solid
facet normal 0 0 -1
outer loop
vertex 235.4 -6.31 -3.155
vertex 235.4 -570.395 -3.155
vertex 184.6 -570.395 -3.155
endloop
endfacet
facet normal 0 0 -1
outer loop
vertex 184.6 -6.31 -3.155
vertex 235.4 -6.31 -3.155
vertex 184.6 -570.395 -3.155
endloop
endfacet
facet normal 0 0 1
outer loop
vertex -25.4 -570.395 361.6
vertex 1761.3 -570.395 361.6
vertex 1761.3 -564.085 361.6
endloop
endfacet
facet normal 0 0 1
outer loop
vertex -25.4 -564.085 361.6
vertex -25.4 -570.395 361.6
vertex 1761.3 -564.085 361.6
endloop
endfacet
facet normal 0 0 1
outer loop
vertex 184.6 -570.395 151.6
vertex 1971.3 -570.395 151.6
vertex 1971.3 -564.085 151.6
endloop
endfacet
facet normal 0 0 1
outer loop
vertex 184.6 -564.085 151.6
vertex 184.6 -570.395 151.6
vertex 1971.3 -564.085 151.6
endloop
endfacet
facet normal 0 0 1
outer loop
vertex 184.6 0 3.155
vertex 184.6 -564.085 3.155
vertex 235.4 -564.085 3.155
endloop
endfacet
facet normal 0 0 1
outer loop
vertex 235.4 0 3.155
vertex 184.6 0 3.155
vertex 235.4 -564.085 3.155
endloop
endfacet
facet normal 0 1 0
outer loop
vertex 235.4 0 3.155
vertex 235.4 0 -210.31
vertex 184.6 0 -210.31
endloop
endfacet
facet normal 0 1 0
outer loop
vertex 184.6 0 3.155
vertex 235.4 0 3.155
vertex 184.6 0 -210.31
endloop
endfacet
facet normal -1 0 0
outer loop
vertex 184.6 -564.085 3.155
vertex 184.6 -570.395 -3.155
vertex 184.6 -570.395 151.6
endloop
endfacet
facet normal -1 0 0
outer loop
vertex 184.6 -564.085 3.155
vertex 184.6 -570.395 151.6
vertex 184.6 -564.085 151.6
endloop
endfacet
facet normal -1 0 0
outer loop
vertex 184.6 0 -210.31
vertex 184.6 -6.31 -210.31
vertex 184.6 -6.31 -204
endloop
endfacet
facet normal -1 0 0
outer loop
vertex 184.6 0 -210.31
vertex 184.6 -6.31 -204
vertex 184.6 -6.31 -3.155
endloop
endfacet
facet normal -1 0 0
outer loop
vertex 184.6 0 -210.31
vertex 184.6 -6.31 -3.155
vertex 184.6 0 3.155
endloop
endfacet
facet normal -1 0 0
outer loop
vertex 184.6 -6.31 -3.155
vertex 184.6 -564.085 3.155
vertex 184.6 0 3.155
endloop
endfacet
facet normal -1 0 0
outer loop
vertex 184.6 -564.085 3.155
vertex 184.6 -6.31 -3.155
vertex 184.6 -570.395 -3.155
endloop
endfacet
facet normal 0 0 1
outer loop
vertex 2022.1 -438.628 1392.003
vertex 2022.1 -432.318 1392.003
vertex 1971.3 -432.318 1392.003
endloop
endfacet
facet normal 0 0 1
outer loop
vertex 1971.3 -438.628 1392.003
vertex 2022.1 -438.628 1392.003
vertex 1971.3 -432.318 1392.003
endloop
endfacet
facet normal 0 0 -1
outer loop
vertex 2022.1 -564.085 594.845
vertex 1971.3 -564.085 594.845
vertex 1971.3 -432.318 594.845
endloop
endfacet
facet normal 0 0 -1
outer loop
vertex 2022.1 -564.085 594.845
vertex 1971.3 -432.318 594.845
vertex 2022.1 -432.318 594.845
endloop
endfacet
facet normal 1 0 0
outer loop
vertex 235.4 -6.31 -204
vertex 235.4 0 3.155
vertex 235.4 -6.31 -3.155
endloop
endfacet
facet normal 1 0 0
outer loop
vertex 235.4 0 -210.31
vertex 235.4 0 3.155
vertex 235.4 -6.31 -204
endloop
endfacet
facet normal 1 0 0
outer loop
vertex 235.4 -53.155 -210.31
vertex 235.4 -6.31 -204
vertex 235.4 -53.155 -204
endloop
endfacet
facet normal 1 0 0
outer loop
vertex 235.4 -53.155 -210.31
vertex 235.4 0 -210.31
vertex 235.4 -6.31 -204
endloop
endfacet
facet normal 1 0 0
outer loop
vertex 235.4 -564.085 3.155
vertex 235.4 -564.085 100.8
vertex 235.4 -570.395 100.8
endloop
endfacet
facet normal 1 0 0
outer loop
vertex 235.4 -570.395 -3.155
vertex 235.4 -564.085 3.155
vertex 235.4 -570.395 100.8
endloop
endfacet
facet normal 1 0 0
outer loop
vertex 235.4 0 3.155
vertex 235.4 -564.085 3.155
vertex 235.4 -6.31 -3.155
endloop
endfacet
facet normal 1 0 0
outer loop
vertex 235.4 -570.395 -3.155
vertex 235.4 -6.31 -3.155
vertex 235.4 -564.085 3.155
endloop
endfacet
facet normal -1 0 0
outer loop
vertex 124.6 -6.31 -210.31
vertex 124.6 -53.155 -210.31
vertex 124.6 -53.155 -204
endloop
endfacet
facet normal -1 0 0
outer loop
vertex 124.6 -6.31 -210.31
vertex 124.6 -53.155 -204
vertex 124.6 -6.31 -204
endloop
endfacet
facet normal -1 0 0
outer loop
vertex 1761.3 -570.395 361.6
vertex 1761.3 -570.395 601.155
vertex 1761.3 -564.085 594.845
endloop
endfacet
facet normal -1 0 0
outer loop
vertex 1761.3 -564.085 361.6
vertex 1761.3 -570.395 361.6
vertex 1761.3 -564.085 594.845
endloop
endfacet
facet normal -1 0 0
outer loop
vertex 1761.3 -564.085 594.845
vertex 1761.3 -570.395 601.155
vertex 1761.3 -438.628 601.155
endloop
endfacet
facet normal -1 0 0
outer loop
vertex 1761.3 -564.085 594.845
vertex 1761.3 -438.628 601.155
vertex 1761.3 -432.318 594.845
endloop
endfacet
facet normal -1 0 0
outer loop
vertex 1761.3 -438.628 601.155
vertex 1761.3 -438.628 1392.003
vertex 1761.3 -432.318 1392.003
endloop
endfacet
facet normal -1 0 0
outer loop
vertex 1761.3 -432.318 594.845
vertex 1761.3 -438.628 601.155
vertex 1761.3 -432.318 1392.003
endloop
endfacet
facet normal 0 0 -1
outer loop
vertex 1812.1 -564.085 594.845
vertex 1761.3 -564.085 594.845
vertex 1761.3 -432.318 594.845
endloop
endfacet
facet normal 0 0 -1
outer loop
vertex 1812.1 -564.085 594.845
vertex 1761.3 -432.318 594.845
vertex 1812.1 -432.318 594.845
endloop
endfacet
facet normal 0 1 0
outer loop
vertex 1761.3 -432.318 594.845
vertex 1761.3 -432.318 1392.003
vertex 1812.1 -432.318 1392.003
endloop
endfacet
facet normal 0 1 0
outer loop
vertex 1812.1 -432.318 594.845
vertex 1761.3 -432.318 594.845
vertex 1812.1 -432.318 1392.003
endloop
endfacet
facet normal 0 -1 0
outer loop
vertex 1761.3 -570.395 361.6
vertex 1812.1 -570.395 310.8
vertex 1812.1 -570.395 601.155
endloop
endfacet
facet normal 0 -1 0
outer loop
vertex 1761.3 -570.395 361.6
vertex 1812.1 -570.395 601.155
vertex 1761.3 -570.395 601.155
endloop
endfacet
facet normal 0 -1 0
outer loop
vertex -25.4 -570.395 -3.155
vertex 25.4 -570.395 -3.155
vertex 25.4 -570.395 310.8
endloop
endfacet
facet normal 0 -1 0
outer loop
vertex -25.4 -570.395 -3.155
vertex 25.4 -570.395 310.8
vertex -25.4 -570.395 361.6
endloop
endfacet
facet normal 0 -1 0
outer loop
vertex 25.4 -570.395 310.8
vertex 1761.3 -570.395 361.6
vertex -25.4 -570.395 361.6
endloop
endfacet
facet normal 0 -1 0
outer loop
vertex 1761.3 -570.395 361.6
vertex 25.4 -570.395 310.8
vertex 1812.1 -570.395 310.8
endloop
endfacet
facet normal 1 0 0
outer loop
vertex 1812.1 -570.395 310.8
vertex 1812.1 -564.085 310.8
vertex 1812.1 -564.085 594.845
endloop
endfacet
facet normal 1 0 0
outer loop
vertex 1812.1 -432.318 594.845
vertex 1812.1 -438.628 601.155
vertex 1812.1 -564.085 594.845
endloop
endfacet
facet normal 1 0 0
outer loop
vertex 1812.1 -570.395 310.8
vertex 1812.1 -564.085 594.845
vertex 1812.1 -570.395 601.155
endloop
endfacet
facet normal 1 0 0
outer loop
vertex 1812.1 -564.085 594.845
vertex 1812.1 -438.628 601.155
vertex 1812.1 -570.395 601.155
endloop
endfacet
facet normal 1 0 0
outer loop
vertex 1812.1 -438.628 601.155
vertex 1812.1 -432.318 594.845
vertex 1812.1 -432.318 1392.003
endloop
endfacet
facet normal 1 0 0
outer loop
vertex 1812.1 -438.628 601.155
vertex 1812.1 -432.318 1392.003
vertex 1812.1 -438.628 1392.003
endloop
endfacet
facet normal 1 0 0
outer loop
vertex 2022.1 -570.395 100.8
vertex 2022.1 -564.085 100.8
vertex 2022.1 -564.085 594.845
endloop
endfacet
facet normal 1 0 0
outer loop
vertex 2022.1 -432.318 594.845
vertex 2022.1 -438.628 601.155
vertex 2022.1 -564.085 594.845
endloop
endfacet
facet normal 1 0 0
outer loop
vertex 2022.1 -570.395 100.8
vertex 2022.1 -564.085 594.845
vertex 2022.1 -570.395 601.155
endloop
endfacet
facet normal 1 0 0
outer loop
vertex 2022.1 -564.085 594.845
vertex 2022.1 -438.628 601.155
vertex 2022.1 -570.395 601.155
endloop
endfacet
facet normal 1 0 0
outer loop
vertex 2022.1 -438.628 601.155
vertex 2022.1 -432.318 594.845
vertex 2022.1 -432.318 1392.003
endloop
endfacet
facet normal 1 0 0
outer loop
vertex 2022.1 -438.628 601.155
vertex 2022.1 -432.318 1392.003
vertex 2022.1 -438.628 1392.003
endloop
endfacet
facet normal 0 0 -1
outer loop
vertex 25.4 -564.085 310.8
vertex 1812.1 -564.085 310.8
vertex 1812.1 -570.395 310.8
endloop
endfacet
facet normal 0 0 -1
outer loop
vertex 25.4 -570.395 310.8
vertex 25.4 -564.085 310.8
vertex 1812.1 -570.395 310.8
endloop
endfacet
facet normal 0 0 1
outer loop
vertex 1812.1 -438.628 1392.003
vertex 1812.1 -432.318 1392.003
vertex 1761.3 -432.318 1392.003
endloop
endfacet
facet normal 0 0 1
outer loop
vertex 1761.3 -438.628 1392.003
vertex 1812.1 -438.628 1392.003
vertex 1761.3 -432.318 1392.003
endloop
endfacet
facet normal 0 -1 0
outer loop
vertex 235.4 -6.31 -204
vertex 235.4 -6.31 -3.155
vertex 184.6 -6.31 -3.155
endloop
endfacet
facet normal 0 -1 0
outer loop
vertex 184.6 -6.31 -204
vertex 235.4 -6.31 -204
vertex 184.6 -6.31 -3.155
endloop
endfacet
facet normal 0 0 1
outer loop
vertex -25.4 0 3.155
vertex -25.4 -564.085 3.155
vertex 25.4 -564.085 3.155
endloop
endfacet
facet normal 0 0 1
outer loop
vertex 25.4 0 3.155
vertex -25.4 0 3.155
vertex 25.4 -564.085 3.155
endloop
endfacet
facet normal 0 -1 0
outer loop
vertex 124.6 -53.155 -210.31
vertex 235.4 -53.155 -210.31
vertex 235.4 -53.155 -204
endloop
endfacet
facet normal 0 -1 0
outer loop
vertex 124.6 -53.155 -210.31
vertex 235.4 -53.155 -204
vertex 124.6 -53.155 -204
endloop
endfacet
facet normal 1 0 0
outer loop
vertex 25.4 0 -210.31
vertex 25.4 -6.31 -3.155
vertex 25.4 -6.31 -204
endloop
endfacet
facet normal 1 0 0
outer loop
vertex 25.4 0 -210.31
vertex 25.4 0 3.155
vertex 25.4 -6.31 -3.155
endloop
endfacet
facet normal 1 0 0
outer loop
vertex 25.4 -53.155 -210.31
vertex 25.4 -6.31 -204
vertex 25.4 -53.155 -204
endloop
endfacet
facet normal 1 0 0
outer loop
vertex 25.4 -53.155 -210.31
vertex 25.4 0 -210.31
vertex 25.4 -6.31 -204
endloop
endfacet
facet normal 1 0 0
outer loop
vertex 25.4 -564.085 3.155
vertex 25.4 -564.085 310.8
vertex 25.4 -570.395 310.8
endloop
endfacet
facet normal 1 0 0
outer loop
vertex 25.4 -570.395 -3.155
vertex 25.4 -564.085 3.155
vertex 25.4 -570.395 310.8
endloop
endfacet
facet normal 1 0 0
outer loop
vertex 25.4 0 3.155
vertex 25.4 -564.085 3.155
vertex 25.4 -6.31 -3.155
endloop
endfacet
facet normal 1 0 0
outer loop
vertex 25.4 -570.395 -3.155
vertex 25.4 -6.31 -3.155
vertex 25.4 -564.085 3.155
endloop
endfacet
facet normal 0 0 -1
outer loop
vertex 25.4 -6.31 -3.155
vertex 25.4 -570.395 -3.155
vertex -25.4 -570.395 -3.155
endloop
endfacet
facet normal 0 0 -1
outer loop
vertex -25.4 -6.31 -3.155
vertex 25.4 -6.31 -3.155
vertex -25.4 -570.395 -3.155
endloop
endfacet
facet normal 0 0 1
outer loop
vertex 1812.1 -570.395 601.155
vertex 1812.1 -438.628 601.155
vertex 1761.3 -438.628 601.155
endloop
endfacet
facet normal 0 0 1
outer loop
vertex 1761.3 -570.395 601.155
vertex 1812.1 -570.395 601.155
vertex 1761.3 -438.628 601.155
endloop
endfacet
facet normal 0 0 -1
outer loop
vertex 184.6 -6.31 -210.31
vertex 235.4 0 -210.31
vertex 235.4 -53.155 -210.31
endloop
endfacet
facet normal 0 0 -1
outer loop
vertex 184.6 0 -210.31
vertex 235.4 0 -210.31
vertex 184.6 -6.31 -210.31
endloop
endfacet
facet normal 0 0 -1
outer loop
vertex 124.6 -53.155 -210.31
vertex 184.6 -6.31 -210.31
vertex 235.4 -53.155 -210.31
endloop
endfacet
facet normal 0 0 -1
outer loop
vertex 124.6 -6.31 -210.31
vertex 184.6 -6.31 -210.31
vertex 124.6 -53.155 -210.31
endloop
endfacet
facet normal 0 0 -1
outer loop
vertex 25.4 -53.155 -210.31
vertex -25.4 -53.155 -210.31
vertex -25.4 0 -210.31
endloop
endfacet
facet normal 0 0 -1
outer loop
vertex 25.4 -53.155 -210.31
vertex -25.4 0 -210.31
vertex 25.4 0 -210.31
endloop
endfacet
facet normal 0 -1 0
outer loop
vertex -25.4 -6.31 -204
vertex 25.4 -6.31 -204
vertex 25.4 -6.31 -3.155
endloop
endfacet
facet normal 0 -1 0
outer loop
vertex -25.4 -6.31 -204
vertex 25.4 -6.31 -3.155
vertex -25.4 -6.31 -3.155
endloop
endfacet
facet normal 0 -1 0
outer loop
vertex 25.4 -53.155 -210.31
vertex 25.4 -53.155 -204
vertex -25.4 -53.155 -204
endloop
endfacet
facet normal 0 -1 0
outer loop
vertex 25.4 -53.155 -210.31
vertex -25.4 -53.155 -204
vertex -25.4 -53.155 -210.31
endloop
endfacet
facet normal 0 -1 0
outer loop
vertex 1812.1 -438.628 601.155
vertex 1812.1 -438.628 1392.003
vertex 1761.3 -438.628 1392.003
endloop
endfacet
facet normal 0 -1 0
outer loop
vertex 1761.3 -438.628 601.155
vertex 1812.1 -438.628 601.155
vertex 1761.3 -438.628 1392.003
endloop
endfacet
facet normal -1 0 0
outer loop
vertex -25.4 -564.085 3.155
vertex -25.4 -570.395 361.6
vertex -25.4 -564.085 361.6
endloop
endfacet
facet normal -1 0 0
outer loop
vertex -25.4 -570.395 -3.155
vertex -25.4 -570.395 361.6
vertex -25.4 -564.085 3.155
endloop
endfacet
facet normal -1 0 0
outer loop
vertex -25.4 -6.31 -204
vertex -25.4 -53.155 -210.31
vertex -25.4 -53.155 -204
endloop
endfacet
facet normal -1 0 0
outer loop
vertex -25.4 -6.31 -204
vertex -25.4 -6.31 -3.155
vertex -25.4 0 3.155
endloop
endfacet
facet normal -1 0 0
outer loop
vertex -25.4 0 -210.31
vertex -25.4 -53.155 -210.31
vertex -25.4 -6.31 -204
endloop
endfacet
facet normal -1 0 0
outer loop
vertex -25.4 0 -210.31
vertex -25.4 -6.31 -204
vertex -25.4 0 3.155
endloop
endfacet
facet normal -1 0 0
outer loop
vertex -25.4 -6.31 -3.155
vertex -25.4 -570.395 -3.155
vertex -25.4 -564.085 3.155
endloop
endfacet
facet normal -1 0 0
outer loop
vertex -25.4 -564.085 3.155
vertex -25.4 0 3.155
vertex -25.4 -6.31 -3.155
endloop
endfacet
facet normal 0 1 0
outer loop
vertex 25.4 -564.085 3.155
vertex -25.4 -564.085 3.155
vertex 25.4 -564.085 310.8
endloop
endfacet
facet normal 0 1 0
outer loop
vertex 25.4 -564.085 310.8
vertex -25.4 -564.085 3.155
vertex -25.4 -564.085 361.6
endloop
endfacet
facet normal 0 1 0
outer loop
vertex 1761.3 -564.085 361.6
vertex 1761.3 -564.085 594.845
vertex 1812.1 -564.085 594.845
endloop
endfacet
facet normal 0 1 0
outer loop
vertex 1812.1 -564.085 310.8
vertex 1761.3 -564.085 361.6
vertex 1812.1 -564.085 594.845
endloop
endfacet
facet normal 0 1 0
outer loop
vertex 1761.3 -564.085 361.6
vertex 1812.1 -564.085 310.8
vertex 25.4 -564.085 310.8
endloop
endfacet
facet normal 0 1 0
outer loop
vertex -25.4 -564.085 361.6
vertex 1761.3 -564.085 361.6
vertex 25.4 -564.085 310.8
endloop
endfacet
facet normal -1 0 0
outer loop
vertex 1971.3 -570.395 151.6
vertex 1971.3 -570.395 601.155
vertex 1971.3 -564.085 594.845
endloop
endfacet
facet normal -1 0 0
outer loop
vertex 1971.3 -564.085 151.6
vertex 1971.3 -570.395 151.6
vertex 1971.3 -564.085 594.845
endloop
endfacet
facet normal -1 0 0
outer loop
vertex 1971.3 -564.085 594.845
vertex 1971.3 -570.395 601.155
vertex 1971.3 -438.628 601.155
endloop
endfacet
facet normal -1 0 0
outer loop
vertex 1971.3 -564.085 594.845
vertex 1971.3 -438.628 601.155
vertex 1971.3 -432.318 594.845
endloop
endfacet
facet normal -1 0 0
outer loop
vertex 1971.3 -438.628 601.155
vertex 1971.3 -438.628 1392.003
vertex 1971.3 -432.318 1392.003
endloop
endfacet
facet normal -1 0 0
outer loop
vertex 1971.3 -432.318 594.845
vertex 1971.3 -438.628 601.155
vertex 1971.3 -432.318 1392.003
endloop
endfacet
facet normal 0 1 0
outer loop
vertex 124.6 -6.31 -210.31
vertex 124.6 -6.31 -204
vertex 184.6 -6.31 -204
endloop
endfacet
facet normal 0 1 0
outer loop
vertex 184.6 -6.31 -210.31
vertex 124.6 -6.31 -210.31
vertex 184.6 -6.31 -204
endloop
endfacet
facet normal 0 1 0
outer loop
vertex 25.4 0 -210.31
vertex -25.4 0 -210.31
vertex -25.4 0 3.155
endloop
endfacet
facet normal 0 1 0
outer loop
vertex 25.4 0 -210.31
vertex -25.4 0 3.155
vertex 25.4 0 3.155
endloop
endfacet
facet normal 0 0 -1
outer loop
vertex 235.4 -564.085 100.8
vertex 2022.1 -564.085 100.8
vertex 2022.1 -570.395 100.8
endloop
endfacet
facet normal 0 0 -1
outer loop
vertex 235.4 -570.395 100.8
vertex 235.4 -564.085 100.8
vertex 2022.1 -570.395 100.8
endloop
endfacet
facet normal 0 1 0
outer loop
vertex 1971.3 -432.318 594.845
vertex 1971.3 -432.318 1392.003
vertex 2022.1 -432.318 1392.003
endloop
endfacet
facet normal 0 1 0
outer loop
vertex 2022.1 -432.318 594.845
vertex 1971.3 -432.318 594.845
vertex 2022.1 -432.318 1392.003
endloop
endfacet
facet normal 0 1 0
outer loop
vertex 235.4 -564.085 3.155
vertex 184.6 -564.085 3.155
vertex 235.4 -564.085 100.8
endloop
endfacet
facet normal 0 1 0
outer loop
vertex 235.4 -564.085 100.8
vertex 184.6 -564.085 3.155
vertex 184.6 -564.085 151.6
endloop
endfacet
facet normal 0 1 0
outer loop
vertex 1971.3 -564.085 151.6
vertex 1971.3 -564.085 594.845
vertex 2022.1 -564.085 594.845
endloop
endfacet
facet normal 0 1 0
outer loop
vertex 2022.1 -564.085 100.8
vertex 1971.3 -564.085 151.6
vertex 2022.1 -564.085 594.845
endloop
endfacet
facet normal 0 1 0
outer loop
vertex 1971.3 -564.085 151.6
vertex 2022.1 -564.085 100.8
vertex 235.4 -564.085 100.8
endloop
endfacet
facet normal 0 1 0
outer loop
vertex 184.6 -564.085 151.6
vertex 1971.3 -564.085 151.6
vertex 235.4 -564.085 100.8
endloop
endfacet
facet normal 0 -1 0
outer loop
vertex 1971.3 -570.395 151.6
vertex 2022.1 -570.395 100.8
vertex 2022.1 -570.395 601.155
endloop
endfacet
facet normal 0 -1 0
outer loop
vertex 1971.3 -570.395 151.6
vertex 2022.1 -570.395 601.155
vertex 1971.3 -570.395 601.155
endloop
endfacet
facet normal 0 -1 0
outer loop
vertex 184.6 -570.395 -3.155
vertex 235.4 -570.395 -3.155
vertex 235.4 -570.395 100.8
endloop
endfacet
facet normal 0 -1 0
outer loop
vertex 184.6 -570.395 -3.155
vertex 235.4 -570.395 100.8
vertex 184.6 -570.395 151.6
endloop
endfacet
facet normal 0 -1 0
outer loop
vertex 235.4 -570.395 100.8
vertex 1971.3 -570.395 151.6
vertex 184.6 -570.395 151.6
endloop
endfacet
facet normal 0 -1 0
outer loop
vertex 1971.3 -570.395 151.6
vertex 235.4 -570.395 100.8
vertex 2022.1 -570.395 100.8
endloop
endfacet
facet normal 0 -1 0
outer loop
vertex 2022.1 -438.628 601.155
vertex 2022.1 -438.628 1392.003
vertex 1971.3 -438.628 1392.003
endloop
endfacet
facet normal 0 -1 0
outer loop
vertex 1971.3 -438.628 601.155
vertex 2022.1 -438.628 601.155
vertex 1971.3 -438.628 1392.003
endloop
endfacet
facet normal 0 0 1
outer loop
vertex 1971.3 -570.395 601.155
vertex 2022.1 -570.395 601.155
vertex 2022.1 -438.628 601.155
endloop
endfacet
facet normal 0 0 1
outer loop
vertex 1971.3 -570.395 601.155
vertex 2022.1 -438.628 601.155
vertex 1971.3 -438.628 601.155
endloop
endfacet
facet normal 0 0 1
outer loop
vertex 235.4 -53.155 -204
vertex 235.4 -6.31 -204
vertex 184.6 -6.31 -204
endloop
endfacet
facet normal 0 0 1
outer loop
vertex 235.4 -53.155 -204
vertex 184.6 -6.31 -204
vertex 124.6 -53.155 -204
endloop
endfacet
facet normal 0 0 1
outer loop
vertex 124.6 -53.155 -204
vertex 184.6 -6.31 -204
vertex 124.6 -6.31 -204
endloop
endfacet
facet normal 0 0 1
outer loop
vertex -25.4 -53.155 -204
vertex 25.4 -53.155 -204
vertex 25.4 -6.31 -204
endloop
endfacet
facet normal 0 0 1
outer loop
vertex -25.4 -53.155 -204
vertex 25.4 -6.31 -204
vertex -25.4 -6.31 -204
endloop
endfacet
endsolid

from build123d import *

# Parameters (mm, degrees)
CROQUIS2_W              = 50.8
CROQUIS2_H              = 6.31
CROQUIS3_W              = 50.8
CROQUIS3_H              = 6.31
CROQUIS4_W              = 60
CROQUIS4_H              = 53.155
SALIENTE_EXTRUIR1_DEPTH = 6.31
CROQUIS5_W              = 60
CROQUIS5_H              = 6.31
CORTAR_EXTRUIR1_DEPTH   = 6.31


with BuildPart() as part:
    # Barrer1: sweep along a curve in space
    with BuildLine() as barrer1_path:
        Line((0, 0, 0), (0, -567.24, 0))
        Line((0, -567.24, 0), (0, -567.24, 336.2))
        Line((0, -567.24, 336.2), (1786.7, -567.24, 336.2))
        Line((1786.7, -567.24, 336.2), (1786.7, -567.24, 598))
        Line((1786.7, -567.24, 598), (1786.7, -435.47278313, 598))
        Line((1786.7, -435.47278313, 598), (1786.7, -435.47278313, 1392.002933))
    # Croquis2 → Barrer1 (sweep)
    with BuildSketch(Plane(origin=(0, 0, 0), x_dir=(1, 0, 0), z_dir=(0, 1, 0))):
        Rectangle(CROQUIS2_W, CROQUIS2_H)
        with Locations((210, 0)):
            Rectangle(CROQUIS2_W, CROQUIS2_H)
    sweep(path=barrer1_path.line, transition=Transition.RIGHT)

    # Barrer4: sweep along a curve in space
    with BuildLine() as barrer4_path:
        Line((-0.201028049, -3.155, -3.155), (-0.201028049, -3.155, -207.155))
        Line((-0.201028049, -3.155, -207.155), (-0.201028049, -53.155, -207.155))
    # Croquis3 → Barrer4 (sweep)
    with BuildSketch(Plane(origin=(0, 0, -3.155), x_dir=(-1, 0, 0), z_dir=(0, 0, -1))):
        with Locations((-210, -3.155)):
            Rectangle(CROQUIS3_W, CROQUIS3_H)
        with Locations((0, -3.155)):
            Rectangle(CROQUIS3_W, CROQUIS3_H)
    sweep(path=barrer4_path.line, transition=Transition.RIGHT)

    # Croquis4 → Saliente-Extruir1 (add)
    with BuildSketch(Plane(origin=(0, 0, -210.31), x_dir=(-1, 0, 0), z_dir=(0, 0, -1))):
        with Locations((-154.6, -26.5775)):
            Rectangle(CROQUIS4_W, CROQUIS4_H)
    extrude(amount=-SALIENTE_EXTRUIR1_DEPTH)

    # Croquis5 → Cortar-Extruir1 (cut)
    with BuildSketch(Plane.XY.offset(-204)):
        with Locations((154.6, -3.155)):
            Rectangle(CROQUIS5_W, CROQUIS5_H)
    extrude(amount=-CORTAR_EXTRUIR1_DEPTH, mode=Mode.SUBTRACT)


solid = part.part
